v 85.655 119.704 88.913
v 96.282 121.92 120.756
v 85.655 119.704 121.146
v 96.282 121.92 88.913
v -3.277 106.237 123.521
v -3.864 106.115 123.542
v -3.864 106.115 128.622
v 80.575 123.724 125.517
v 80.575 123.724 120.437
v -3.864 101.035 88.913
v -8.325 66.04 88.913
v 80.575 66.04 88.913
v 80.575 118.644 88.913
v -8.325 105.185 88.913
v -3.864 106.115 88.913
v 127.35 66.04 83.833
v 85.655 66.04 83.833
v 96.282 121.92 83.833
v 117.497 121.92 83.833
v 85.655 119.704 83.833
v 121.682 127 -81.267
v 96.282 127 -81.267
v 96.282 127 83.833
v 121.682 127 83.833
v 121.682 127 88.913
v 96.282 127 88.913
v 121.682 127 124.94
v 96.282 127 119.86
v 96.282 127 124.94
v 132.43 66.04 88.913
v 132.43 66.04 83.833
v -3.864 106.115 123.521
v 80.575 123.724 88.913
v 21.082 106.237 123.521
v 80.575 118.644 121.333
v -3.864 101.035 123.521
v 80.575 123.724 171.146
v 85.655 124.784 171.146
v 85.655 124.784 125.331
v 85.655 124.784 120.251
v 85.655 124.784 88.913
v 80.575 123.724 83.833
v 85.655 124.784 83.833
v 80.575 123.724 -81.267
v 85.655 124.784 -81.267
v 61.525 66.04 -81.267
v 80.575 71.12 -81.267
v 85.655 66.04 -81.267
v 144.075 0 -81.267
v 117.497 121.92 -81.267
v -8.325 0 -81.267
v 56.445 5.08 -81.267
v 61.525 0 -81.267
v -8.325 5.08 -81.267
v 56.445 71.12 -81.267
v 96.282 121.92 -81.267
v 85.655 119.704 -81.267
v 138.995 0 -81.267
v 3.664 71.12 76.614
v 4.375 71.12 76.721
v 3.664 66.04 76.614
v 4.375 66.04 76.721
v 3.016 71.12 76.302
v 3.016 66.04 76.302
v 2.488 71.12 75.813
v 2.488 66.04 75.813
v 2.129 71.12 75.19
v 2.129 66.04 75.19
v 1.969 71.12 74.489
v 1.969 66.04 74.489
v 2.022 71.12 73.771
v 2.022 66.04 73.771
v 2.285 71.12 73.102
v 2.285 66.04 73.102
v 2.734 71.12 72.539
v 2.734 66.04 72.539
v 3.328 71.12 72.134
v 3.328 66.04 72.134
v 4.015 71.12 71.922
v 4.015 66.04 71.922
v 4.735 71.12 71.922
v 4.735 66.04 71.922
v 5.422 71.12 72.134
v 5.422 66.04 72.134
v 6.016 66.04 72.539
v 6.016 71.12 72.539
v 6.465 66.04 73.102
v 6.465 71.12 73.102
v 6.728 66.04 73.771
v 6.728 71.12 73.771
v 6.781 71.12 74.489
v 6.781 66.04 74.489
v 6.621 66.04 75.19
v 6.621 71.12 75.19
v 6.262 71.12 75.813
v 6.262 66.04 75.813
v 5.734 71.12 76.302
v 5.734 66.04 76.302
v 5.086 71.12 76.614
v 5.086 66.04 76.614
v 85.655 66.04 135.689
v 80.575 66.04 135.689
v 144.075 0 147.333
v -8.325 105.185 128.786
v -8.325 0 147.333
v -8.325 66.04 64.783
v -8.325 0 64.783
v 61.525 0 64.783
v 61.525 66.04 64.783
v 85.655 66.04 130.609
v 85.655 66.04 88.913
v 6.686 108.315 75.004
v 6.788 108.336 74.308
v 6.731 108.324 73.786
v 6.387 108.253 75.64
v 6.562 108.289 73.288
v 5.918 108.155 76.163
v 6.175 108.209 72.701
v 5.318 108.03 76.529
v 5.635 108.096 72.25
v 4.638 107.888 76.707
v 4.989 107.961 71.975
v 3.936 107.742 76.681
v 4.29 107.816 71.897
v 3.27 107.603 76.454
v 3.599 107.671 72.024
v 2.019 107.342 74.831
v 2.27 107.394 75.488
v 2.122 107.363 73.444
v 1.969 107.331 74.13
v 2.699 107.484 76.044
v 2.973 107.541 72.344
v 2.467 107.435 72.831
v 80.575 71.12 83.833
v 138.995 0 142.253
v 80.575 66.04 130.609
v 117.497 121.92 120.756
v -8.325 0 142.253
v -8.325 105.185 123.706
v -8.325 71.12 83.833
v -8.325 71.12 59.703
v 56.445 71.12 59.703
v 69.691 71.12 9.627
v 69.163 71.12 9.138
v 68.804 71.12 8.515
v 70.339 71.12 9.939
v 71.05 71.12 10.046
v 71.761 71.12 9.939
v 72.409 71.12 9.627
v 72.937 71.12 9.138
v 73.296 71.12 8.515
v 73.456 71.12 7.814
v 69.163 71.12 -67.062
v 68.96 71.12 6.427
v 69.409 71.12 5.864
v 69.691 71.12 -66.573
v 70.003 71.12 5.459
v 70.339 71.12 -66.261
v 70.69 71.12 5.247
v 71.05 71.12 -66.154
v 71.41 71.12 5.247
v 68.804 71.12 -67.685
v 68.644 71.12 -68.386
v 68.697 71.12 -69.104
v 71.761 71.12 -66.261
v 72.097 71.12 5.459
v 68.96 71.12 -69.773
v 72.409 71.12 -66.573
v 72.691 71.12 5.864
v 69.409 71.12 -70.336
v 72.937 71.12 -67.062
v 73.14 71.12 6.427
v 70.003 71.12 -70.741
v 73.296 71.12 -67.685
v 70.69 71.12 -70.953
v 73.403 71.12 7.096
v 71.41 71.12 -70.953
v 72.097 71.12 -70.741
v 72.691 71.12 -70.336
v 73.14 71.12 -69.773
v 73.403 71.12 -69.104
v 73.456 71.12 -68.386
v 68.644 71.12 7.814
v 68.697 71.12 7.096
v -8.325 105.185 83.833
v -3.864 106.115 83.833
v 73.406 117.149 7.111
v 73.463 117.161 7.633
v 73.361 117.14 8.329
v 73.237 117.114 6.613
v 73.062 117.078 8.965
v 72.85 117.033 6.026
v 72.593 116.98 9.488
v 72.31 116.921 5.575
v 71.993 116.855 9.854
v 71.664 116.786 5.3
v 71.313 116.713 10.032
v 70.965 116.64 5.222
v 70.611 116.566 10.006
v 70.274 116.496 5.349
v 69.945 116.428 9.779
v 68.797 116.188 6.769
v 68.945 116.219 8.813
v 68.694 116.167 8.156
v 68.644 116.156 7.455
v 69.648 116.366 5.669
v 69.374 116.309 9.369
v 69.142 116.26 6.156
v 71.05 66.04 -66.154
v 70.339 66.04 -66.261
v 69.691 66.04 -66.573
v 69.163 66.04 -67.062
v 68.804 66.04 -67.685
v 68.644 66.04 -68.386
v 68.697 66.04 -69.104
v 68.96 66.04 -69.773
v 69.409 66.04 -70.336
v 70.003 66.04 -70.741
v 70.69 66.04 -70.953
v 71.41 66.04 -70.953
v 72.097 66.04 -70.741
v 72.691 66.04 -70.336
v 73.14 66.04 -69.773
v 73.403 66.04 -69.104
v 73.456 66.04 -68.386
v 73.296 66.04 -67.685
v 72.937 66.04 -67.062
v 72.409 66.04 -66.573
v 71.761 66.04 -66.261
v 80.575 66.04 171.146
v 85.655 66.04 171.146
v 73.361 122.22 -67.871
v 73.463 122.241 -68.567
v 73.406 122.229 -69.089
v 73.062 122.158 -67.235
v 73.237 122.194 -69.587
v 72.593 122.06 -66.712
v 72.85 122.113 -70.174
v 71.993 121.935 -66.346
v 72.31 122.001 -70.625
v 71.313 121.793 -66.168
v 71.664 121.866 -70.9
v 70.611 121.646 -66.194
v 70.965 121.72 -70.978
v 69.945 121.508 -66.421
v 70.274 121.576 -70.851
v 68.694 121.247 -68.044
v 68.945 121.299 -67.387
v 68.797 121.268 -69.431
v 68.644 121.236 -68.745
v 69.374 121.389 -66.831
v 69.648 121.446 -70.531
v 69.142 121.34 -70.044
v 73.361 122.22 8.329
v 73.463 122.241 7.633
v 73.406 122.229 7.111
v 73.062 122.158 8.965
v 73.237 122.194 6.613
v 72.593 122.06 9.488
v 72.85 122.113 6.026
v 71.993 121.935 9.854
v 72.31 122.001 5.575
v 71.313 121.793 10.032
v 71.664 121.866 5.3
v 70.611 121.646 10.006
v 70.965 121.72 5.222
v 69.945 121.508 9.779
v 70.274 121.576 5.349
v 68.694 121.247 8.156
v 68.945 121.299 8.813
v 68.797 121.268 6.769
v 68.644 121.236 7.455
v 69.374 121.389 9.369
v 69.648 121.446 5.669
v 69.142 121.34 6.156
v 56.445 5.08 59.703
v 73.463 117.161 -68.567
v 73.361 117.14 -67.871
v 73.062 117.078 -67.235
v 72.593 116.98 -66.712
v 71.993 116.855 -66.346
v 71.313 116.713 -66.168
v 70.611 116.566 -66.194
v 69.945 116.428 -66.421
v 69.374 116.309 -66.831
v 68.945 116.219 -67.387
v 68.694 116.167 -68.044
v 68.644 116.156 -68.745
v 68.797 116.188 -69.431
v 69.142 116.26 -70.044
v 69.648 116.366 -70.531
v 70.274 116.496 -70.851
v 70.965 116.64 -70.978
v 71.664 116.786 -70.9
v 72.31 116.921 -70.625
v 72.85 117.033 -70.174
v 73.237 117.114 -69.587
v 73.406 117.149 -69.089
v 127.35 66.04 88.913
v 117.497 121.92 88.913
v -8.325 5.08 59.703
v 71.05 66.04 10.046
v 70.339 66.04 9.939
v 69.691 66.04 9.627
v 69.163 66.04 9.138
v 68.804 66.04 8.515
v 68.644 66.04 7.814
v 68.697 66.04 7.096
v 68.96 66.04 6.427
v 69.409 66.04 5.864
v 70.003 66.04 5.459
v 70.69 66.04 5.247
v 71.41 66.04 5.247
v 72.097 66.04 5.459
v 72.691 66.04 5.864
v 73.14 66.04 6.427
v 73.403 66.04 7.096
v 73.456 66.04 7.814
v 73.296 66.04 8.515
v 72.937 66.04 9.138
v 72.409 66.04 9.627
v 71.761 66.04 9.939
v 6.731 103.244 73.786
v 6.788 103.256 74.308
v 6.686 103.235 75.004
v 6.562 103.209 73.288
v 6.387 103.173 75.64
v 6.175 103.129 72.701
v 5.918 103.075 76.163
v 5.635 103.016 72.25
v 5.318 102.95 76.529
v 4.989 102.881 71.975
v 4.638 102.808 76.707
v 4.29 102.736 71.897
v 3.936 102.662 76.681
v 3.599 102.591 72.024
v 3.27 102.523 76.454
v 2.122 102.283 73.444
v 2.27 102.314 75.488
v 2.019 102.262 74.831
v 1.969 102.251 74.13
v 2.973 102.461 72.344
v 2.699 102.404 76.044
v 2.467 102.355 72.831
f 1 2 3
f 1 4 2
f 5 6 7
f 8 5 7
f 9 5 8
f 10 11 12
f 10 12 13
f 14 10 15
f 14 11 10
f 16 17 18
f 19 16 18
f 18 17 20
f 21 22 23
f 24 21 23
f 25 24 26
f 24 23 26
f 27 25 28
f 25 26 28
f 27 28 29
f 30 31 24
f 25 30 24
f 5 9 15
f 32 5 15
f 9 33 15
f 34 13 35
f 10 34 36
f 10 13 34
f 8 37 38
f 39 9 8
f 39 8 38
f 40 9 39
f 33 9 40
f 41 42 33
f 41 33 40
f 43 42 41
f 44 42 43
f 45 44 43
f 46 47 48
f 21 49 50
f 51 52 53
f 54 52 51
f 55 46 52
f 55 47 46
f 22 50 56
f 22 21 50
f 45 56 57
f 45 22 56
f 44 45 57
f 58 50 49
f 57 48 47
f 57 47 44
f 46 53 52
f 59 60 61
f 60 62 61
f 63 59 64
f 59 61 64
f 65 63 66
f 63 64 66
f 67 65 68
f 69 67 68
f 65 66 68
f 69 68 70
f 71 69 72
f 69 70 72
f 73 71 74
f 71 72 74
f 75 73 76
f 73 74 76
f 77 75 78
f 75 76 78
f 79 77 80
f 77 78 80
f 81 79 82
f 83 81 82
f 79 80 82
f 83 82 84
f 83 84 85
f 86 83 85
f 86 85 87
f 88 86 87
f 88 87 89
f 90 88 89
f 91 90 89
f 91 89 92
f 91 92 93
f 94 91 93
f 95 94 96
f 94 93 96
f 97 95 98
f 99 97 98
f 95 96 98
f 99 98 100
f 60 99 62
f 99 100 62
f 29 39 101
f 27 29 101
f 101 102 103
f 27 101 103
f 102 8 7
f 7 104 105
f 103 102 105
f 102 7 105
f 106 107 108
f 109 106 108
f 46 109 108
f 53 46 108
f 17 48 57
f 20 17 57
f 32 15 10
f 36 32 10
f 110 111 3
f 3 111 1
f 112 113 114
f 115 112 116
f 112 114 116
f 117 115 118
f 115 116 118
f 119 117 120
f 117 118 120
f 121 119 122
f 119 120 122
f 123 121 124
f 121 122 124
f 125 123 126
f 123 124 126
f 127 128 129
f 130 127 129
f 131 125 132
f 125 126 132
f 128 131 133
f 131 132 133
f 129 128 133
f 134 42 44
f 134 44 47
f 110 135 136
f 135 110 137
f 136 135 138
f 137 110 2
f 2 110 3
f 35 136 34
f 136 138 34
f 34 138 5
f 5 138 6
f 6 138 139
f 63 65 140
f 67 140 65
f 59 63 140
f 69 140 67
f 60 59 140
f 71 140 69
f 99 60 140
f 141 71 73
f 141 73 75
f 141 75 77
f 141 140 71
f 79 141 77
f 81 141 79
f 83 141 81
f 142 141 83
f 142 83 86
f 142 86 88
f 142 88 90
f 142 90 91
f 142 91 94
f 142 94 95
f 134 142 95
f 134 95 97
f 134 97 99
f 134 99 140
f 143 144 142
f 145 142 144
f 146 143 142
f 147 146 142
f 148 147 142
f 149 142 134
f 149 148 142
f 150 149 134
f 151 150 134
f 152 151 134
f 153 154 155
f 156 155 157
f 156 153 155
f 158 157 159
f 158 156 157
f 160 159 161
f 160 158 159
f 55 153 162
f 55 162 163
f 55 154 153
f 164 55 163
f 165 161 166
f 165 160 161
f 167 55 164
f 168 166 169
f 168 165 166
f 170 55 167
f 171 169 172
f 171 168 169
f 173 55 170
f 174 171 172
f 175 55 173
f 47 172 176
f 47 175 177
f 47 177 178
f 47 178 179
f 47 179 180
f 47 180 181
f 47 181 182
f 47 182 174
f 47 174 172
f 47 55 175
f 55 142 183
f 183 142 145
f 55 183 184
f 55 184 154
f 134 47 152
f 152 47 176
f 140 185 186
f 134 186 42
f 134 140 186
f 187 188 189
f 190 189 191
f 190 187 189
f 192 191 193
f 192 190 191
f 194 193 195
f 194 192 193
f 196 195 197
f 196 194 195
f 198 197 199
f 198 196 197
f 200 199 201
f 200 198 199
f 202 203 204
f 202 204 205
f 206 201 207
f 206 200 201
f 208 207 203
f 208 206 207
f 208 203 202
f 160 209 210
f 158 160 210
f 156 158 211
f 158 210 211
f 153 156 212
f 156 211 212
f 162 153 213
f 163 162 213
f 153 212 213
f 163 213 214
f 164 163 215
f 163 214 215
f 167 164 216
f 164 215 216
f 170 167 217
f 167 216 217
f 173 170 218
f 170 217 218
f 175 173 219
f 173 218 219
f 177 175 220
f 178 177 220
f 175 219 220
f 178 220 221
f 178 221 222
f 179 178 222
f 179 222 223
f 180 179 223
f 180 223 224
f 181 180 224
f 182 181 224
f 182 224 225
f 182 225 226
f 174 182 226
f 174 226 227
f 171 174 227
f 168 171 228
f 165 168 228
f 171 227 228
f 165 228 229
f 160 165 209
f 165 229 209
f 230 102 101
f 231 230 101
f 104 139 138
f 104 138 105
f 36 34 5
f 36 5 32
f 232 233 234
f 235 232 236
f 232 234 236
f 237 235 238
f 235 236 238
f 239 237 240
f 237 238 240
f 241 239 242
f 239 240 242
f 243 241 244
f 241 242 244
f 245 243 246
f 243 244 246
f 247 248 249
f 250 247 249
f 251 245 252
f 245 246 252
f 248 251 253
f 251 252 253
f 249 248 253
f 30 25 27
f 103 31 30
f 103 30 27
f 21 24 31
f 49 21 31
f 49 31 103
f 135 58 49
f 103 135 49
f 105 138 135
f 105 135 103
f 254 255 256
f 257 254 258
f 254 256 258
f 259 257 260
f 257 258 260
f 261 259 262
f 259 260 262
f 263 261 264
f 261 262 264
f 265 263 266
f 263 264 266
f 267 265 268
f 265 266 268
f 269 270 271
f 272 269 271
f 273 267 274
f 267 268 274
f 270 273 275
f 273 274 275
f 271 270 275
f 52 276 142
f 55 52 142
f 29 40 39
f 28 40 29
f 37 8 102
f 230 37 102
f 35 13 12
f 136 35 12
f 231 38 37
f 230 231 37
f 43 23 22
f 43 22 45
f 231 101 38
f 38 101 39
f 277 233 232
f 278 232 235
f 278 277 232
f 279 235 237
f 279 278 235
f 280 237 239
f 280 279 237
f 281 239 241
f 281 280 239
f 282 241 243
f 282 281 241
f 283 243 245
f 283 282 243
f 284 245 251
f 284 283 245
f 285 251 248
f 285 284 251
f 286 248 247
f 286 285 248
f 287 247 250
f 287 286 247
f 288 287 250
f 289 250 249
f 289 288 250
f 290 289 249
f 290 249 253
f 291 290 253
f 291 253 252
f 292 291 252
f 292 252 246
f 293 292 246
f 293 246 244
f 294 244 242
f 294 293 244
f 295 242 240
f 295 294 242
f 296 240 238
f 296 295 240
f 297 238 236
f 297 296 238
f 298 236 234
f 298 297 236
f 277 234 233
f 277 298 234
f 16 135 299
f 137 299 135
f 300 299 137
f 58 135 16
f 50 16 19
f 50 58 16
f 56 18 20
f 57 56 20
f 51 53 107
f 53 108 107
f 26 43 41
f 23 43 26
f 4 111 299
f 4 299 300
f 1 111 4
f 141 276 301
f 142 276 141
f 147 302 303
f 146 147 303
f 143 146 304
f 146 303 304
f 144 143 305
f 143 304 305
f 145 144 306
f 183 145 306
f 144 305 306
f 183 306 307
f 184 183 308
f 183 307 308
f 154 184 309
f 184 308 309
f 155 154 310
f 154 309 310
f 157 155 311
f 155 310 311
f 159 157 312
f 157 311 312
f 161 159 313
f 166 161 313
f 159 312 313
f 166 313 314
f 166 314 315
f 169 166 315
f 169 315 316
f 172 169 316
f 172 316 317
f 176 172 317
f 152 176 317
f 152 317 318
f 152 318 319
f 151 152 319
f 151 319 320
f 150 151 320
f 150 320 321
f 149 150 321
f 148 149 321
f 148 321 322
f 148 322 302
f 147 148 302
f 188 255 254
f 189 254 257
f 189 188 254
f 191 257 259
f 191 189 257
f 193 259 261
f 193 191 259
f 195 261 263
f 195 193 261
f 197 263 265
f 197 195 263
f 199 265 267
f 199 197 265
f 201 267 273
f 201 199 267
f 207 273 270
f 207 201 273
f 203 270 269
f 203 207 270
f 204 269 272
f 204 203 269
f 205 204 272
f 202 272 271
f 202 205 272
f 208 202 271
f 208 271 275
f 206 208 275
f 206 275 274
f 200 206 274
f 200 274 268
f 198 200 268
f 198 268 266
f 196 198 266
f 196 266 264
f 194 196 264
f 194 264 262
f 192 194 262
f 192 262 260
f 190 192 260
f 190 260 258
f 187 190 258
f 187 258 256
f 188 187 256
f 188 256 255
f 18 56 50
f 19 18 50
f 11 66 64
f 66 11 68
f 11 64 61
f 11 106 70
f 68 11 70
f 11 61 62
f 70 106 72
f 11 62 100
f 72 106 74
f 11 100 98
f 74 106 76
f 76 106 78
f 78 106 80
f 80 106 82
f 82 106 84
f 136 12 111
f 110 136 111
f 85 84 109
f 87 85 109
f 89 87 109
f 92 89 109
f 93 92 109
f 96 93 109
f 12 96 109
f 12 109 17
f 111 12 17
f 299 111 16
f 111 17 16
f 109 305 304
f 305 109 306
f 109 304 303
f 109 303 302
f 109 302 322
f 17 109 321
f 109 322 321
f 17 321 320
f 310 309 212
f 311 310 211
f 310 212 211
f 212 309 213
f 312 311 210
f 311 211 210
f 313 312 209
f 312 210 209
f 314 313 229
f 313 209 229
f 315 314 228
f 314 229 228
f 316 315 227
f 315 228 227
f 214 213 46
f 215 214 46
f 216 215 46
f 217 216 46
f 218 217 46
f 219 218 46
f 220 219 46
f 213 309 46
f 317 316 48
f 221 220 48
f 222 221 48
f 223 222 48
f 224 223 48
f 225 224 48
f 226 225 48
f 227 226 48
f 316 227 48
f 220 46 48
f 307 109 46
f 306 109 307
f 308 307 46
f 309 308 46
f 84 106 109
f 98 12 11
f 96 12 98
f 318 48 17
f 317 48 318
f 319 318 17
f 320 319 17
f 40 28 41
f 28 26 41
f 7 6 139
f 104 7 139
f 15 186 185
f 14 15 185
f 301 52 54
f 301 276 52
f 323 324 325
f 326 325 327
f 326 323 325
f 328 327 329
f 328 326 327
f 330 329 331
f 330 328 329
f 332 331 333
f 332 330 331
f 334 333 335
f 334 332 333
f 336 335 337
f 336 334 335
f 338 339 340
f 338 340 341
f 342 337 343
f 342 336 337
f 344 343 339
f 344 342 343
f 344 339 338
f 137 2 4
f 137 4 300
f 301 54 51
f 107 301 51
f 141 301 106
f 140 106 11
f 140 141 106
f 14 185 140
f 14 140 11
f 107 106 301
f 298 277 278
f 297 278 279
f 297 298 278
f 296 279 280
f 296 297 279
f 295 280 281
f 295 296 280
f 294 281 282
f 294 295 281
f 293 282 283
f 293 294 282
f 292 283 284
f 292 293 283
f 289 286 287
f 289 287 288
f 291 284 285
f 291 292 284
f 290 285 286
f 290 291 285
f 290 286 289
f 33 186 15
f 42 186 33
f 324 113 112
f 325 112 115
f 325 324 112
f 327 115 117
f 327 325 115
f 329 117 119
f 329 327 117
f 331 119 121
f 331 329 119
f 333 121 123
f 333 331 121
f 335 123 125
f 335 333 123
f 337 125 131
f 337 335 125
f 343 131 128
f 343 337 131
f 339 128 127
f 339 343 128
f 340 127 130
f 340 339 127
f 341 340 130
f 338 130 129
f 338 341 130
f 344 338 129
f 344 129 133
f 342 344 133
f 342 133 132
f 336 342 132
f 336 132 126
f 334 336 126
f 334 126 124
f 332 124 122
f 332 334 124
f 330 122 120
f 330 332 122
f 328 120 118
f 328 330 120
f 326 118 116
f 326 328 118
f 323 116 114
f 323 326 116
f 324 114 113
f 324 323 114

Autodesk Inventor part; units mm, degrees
ref_plane "YZ Plane" through (0, 0, 0) normal (1, 0, 0) x (0, 1, 0)
ref_plane "XZ Plane" through (0, 0, 0) normal (0, 1, 0) x (-1, 0, 0)
ref_plane "XY Plane" through (0, 0, 0) normal (0, 0, 1) x (1, 0, 0)
sketch "Sketch1" plane through (0, 0, 0) normal (0, 1, 0) x (-1, 0, 0)
  line L0 (8.325, 64.7833) -> (-61.525, 64.7833)
  line L1 (-61.525, 64.7833) -> (-61.525, -81.2667)
  line L2 (-61.525, -81.2667) -> (8.325, -81.2667)
  line L3 (8.325, -81.2667) -> (8.325, 64.7833)
  point P0 (0, 0)
  dimension "d0" = 146.05
  dimension "d1" = 69.85
extrude "Extrusion1" add sketch "Sketch1" along normal blind 5.08
sketch "Sketch2" plane through (61.525, 0, 64.7833) normal (1, 0, 0) x (0, 0, -1)
  line L0 (0, 5.08) -> (146.05, 5.08) projected
  line L1 (0, 5.08) -> (5.08, 5.08)
  line L2 (5.08, 5.08) -> (5.08, 71.12)
  line L3 (5.08, 71.12) -> (0, 71.12)
  line L4 (0, 71.12) -> (0, 5.08)
  line L5 (0, 0) -> (146.05, 0) projected
  point P0 (64.7833, 0)
  dimension "d4" = 5.08
  dimension "d5" = 71.12
extrude "Extrusion2" add sketch "Sketch2" against normal blind 69.85
sketch "Sketch3" plane through (61.525, 0, -81.2667) normal (0, 0, -1) x (-1, 0, 0)
  line L0 (0, 5.08) -> (69.85, 5.08) projected
  line L1 (0, 0) -> (69.85, 0) projected
  line L2 (0, 5.08) -> (5.08, 5.08)
  line L3 (5.08, 5.08) -> (5.08, 71.12)
  line L4 (5.08, 71.12) -> (0, 71.12)
  line L5 (0, 71.12) -> (0, 5.08)
  point P0 (61.525, 0)
  dimension "d8" = 5.08
  dimension "d9" = 71.12
extrude "Extrusion3" add sketch "Sketch3" against normal blind 146.05
sketch "Sketch4" plane through (61.525, 71.12, 64.7833) normal (0, 1, 0) x (1, 0, 0)
  line L0 (-5.08, 5.08) -> (-69.85, 5.08) projected
  line L1 (-5.08, 146.05) -> (-5.08, 5.08) projected
  line L2 (-69.85, 5.08) -> (-5.08, 5.08) projected
  line L3 (-69.85, 5.08) -> (-69.85, -19.05)
  line L4 (-69.85, -19.05) -> (19.05, -19.05)
  line L5 (19.05, -19.05) -> (19.05, 146.05)
  line L6 (19.05, 146.05) -> (-5.08, 146.05)
  line L7 (-5.08, 5.08) -> (-5.08, 146.05) projected
  line L8 (-5.08, 5.08) -> (-5.08, 146.05)
  line L9 (-5.08, 5.08) -> (-69.85, 5.08)
  point P0 (-61.525, 64.7833)
  dimension "d12" = 24.13
  dimension "d13" = 24.13
extrude "Extrusion4" add sketch "Sketch4" against normal blind 5.08
sketch "Sketch5" plane through (-8.325, 71.12, 59.7033) normal (0, 1, 0) x (1, 0, 0)
  line L0 (88.9, -24.13) -> (88.9, 140.97) projected
  line L1 (0, -24.13) -> (88.9, -24.13) projected
  point P0 (8.325, 59.7033)
  point P1 (12.7, -14.605)
  point P2 (79.375, 52.07)
  point P3 (79.375, 128.27)
  dimension "d16" = 9.525
  dimension "d17" = 9.525
  dimension "d18" = 76.2
  dimension "d19" = 76.2
  dimension "d20" = 9.525
  dimension "d21" = 76.2
hole "Hole1" at (4.375, 71.12, 74.3083) at (71.05, 71.12, 7.6333) at (71.05, 71.12, -68.5667) direction (0, -1, 0) diameter 4.826 end through all
sketch "Sketch6" plane through (-8.325, 0, -81.2667) normal (-1, 0, 0) x (0, 0, 1)
  line L0 (223.52, 0) -> (228.6, 0)
  line L1 (0, 0) -> (0, 5.08) projected
  line L2 (146.05, 0) -> (146.05, 66.04) projected
  line L3 (223.52, 0) -> (201.1265, 127)
  line L4 (201.1265, 127) -> (206.2065, 127)
  line L5 (206.2065, 127) -> (228.6, 0)
  point P0 (81.2667, 0)
  dimension "d29" = 228.6
  dimension "d30" = 5.08
  dimension "d32" = 10
  dimension "d33" = 5.08
  dimension "d34" = 127
extrude "Extrusion5" add sketch "Sketch6" against normal blind 152.4
sketch "Sketch7" plane through (61.525, 0, -81.2667) normal (0, 0, -1) x (-1, 0, 0)
  line L0 (-82.55, 0) -> (-77.47, 0)
  line L1 (69.85, 0) -> (-82.55, 0) projected
  line L2 (-77.47, 0) -> (-55.0765, 127)
  line L3 (0, 0) -> (0, 66.04) projected
  line L4 (69.85, 127) -> (-82.55, 127) projected
  line L5 (-55.0765, 127) -> (-60.1565, 127)
  line L6 (-60.1565, 127) -> (-82.55, 0)
  point P0 (61.525, 0)
  dimension "d37" = 5.08
  dimension "d38" = 10
  dimension "d39" = 5.08
extrude "Extrusion6" add sketch "Sketch7" against normal blind 228.6
sketch "Sketch8" plane through (61.525, 0, -81.2667) normal (0, 0, -1) x (-1, 0, 0)
  line L0 (-60.1565, 127) -> (-82.55, 0) projected
  line L1 (-60.1565, 127) -> (-82.55, 127) projected
  line L2 (-82.55, 0) -> (-82.55, 127) projected
  point P0 (61.525, 0)
extrude "Extrusion7" cut sketch "Sketch8" against normal blind 228.6
sketch "Sketch9" plane through (-8.325, 0, -81.2667) normal (-1, 0, 0) x (0, 0, 1)
  line L0 (228.6, 0) -> (206.2065, 127) projected
  line L1 (206.2065, 127) -> (228.6, 127) projected
  line L2 (228.6, 127) -> (228.6, 0) projected
  point P0 (81.2667, 0)
extrude "Extrusion8" cut sketch "Sketch9" against normal blind 228.6
sketch "Sketch10" plane through (61.525, 0, -81.2667) normal (0, 0, -1) x (-1, 0, 0)
  line L0 (-60.1565, 127) -> (-82.55, 0) projected
  line L1 (-60.1565, 127) -> (-34.7565, 127)
  line L2 (-34.7565, 127) -> (-34.7565, 121.92)
  line L3 (-34.7565, 121.92) -> (-60.1565, 121.92)
  line L4 (-60.1565, 121.92) -> (-60.1565, 127)
  point P0 (61.525, 0)
  dimension "d46" = 25.4
  dimension "d47" = 5.08
extrude "Extrusion9" add sketch "Sketch10" against normal blind 204.7875
sketch "Sketch13" plane through (61.525, 0, -81.2667) normal (0, 0, -1) x (-1, 0, 0)
  line L0 (-34.7565, 127) -> (-60.1565, 127) projected
  line L1 (-34.7565, 127) -> (65.3895, 106.1149)
  line L2 (65.3895, 106.1149) -> (65.3895, 101.0349)
  line L3 (-34.7565, 127) -> (-34.7565, 121.92) projected
  line L4 (-34.7565, 127) -> (-34.7565, 121.92)
  line L5 (-34.7565, 121.92) -> (65.3895, 101.0349)
  point P0 (61.525, 0)
  dimension "d50" = 5.08
  dimension "d51" = 168.22
extrude "Extrusion10" add sketch "Sketch13" against normal blind 204.7875
sketch "Sketch14" plane through (-8.325, 0, -81.2667) normal (-1, 0, 0) x (0, 0, 1)
  line L0 (0, 66.04) -> (165.1, 66.04) projected
  line L1 (165.1, 66.04) -> (170.18, 66.04)
  line L2 (170.18, 66.04) -> (170.18, 144.8486)
  line L3 (165.1, 66.04) -> (165.1, 144.8486)
  line L4 (165.1, 144.8486) -> (170.18, 144.8486)
  point P0 (81.2667, 0)
  dimension "d54" = 5.08
extrude "Extrusion11" add sketch "Sketch14" against normal blind 201.6125
sketch "Sketch15" plane through (61.525, 0, -81.2667) normal (0, 0, -1) x (-1, 0, 0)
  line L0 (-19.05, 66.04) -> (-65.8254, 66.04) projected
  line L1 (-19.05, 66.04) -> (-24.13, 66.04)
  line L2 (-24.13, 66.04) -> (-24.13, 144.9245)
  line L3 (-24.13, 144.9245) -> (-19.05, 144.9245)
  line L4 (-19.05, 144.9245) -> (-19.05, 66.04)
  point P0 (61.525, 0)
  dimension "d57" = 5.08
extrude "Extrusion12" add sketch "Sketch15" against normal blind 252.4125
sketch "Sketch18" plane through (-8.325, 71.12, 83.8333) normal (0, 0, -1) x (-1, 0, 0)
  line L0 (-4.4605, 34.9949) -> (-88.9, 52.6045) projected
  line L1 (-88.9, 52.6045) -> (26.3817, 28.5629)
  line L2 (-88.9, 52.6045) -> (-88.9, 80.9754)
  line L3 (-88.9, 80.9754) -> (26.3817, 80.9754)
  line L4 (26.3817, 80.9754) -> (26.3817, 28.5629)
  point P0 (-8.325, -71.12)
extrude "Extrusion14" cut sketch "Sketch18" against normal blind 133.35
sketch "Sketch19" plane through (61.525, 0, -81.2667) normal (0, 0, -1) x (-1, 0, 0)
  line L0 (-19.05, 66.04) -> (-19.05, 123.7245) projected
  line L1 (-24.13, 124.7839) -> (-34.7565, 127) projected
  line L2 (-19.05, 123.7245) -> (-34.7565, 127)
  line L3 (-34.7565, 127) -> (-82.8145, 127)
  line L4 (-82.8145, 127) -> (-82.8145, 152.1406)
  line L5 (-82.8145, 152.1406) -> (-18.2912, 151.7847)
  line L6 (-18.2912, 151.7847) -> (-19.05, 123.7245)
  point P0 (61.525, 0)
extrude "Extrusion15" cut sketch "Sketch19" against normal blind 338.1375
sketch "Sketch21" plane through (0, 5.08, 0) normal (0, 1, 0) x (1, 0, 0)
  line L0 (56.445, -59.7033) -> (56.445, 81.2667) projected
  line L1 (56.445, 81.2667) -> (-8.325, 81.2667) projected
  line L2 (-8.325, 81.2667) -> (-8.325, -59.7033) projected
  line L3 (-8.325, -59.7033) -> (56.445, -59.7033) projected
  point P0 (0, 0)
extrude "Extrusion16" cut sketch "Sketch21" along normal blind 338.1375
sketch "Sketch22" plane through (-8.325, 71.12, 59.7033) normal (0, 1, 0) x (1, 0, 0)
  circle A0 centre (79.375, 52.07) radius 2.413 projected
  circle A1 centre (12.7, -14.605) radius 2.413 projected
  circle A2 centre (79.375, 128.27) radius 2.413 projected
  line L0 (64.77, 0) -> (0, 0) projected
  line L1 (0, 0) -> (0, -24.13) projected
  line L2 (0, -24.13) -> (88.9, -24.13) projected
  line L3 (88.9, -24.13) -> (88.9, 140.97) projected
  line L4 (64.77, 140.97) -> (88.9, 140.97) projected
  line L5 (64.77, 140.97) -> (64.77, 0) projected
  point P0 (8.325, 59.7033)
extrude "Extrusion17" cut sketch "Sketch22" along normal blind 338.1375
sketch "Sketch23" plane through (193.2875, 66.04, 83.8333) normal (0, 0, -1) x (-1, 0, 0)
  line L0 (60.8571, 0) -> (0, 0) projected
  line L1 (60.8571, 0) -> (76.6392, 89.5043)
  line L2 (71.606, 60.96) -> (49.2125, -66.04) projected
  line L3 (76.6392, 89.5043) -> (-29.2639, 89.5043)
  line L4 (-29.2639, 89.5043) -> (-29.2639, 0)
  line L5 (-29.2639, 0) -> (60.8571, 0)
  point P0 (193.2875, -66.04)
extrude "Extrusion18" cut sketch "Sketch23" against normal blind 338.1375
equation "\"d0\" = DU1CHLength"
equation "\"d1\" = DU1CHWidth"
equation "\"d2\" = WallWidth"
equation "\"d4\" = WallWidth"
equation "\"d5\" = CPDeckHeight"
equation "\"d6\" = DU1CHWidth"
equation "\"d8\" = WallWidth"
equation "\"d9\" = CPDeckHeight"
equation "\"d10\" = DU1CHLength"
equation "\"d12\" = WallWidth + ControlPlateShelfLength"
equation "\"d13\" = WallWidth + ControlPlateShelfLength"
equation "\"d14\" = WallWidth"
equation "\"d16\" = ControlHoleBoltHoleMid"
equation "\"d17\" = ControlHoleBoltHoleMid"
equation "\"d18\" = ControlPlateScrewLength"
equation "\"d19\" = ControlPlateScrewLength"
equation "\"d20\" = ControlHoleBoltHoleMid"
equation "\"d21\" = ControlPlateScrewLength"
equation "\"d29\" = PartLength"
equation "\"d30\" = WallWidth"
equation "\"d32\" = EdgeAngle"
equation "\"d33\" = WallWidth"
equation "\"d34\" = DSBackHeight"
equation "\"d35\" = PartWidth"
equation "\"d37\" = WallWidth"
equation "\"d38\" = EdgeAngle"
equation "\"d39\" = WallWidth"
equation "\"d40\" = PartLength"
equation "\"d42\" = PartLength"
equation "\"d44\" = PartLength"
equation "\"d46\" = BackShelf"
equation "\"d47\" = WallWidth"
equation "\"d50\" = WallWidth"
equation "\"d51\" = MainAngle"
equation "\"d54\" = WallWidth"
equation "\"d57\" = WallWidth"
equation "\"DSLength\" = 1371.6"
equation "\"DSWidth\" = 304.8"
equation "\"DCDeckHeight\" = 76.2"
equation "\"WallWidth\" = 5.08"
equation "\"EdgeAngle\" = 10deg"
equation "\"LengthCuts\" = 152.4"
equation "\"WidthCuts\" = 50.8"
equation "\"PartLength\" = 228.6"
equation "\"PartWidth\" = 152.4"
equation "\"BoltHoldDiam\" = 6.35"
equation "\"ControlPlateLength\" = 228.6"
equation "\"ControlPlateWidth\" = 228.6"
equation "\"ControlPlateShelfLength\" = 19.05"
equation "\"ControlHoleLength\" = 190.5"
equation "\"ControlHoleWidth\" = 190.5"
equation "\"ControlHoleFromSide\" = 63.5"
equation "\"ControlHoleBoltHoleMid\" = 9.525"
equation "\"DU1CHWidth\" = 69.85"
equation "\"CPFromSide\" = 63.5"
equation "\"CPFromBack\" = 63.5"
equation "\"DU1CHLength\" = 146.05"
equation "\"CPDeckHeight\" = 71.12"
equation "\"ControlPlateScrewLength\" = 76.2"
equation "\"DSBackHeight\" = 127"
equation "\"BackShelf\" = 25.4"
equation "\"MainAngle\" = 168.22deg"
equation "\"CPDWidthHole\" = 120.65"
equation "\"CPDLengthHole\" = 146.05"
equation "\"DownBackHeight\" = 130.7084"
properties part number "CPURightOne"
